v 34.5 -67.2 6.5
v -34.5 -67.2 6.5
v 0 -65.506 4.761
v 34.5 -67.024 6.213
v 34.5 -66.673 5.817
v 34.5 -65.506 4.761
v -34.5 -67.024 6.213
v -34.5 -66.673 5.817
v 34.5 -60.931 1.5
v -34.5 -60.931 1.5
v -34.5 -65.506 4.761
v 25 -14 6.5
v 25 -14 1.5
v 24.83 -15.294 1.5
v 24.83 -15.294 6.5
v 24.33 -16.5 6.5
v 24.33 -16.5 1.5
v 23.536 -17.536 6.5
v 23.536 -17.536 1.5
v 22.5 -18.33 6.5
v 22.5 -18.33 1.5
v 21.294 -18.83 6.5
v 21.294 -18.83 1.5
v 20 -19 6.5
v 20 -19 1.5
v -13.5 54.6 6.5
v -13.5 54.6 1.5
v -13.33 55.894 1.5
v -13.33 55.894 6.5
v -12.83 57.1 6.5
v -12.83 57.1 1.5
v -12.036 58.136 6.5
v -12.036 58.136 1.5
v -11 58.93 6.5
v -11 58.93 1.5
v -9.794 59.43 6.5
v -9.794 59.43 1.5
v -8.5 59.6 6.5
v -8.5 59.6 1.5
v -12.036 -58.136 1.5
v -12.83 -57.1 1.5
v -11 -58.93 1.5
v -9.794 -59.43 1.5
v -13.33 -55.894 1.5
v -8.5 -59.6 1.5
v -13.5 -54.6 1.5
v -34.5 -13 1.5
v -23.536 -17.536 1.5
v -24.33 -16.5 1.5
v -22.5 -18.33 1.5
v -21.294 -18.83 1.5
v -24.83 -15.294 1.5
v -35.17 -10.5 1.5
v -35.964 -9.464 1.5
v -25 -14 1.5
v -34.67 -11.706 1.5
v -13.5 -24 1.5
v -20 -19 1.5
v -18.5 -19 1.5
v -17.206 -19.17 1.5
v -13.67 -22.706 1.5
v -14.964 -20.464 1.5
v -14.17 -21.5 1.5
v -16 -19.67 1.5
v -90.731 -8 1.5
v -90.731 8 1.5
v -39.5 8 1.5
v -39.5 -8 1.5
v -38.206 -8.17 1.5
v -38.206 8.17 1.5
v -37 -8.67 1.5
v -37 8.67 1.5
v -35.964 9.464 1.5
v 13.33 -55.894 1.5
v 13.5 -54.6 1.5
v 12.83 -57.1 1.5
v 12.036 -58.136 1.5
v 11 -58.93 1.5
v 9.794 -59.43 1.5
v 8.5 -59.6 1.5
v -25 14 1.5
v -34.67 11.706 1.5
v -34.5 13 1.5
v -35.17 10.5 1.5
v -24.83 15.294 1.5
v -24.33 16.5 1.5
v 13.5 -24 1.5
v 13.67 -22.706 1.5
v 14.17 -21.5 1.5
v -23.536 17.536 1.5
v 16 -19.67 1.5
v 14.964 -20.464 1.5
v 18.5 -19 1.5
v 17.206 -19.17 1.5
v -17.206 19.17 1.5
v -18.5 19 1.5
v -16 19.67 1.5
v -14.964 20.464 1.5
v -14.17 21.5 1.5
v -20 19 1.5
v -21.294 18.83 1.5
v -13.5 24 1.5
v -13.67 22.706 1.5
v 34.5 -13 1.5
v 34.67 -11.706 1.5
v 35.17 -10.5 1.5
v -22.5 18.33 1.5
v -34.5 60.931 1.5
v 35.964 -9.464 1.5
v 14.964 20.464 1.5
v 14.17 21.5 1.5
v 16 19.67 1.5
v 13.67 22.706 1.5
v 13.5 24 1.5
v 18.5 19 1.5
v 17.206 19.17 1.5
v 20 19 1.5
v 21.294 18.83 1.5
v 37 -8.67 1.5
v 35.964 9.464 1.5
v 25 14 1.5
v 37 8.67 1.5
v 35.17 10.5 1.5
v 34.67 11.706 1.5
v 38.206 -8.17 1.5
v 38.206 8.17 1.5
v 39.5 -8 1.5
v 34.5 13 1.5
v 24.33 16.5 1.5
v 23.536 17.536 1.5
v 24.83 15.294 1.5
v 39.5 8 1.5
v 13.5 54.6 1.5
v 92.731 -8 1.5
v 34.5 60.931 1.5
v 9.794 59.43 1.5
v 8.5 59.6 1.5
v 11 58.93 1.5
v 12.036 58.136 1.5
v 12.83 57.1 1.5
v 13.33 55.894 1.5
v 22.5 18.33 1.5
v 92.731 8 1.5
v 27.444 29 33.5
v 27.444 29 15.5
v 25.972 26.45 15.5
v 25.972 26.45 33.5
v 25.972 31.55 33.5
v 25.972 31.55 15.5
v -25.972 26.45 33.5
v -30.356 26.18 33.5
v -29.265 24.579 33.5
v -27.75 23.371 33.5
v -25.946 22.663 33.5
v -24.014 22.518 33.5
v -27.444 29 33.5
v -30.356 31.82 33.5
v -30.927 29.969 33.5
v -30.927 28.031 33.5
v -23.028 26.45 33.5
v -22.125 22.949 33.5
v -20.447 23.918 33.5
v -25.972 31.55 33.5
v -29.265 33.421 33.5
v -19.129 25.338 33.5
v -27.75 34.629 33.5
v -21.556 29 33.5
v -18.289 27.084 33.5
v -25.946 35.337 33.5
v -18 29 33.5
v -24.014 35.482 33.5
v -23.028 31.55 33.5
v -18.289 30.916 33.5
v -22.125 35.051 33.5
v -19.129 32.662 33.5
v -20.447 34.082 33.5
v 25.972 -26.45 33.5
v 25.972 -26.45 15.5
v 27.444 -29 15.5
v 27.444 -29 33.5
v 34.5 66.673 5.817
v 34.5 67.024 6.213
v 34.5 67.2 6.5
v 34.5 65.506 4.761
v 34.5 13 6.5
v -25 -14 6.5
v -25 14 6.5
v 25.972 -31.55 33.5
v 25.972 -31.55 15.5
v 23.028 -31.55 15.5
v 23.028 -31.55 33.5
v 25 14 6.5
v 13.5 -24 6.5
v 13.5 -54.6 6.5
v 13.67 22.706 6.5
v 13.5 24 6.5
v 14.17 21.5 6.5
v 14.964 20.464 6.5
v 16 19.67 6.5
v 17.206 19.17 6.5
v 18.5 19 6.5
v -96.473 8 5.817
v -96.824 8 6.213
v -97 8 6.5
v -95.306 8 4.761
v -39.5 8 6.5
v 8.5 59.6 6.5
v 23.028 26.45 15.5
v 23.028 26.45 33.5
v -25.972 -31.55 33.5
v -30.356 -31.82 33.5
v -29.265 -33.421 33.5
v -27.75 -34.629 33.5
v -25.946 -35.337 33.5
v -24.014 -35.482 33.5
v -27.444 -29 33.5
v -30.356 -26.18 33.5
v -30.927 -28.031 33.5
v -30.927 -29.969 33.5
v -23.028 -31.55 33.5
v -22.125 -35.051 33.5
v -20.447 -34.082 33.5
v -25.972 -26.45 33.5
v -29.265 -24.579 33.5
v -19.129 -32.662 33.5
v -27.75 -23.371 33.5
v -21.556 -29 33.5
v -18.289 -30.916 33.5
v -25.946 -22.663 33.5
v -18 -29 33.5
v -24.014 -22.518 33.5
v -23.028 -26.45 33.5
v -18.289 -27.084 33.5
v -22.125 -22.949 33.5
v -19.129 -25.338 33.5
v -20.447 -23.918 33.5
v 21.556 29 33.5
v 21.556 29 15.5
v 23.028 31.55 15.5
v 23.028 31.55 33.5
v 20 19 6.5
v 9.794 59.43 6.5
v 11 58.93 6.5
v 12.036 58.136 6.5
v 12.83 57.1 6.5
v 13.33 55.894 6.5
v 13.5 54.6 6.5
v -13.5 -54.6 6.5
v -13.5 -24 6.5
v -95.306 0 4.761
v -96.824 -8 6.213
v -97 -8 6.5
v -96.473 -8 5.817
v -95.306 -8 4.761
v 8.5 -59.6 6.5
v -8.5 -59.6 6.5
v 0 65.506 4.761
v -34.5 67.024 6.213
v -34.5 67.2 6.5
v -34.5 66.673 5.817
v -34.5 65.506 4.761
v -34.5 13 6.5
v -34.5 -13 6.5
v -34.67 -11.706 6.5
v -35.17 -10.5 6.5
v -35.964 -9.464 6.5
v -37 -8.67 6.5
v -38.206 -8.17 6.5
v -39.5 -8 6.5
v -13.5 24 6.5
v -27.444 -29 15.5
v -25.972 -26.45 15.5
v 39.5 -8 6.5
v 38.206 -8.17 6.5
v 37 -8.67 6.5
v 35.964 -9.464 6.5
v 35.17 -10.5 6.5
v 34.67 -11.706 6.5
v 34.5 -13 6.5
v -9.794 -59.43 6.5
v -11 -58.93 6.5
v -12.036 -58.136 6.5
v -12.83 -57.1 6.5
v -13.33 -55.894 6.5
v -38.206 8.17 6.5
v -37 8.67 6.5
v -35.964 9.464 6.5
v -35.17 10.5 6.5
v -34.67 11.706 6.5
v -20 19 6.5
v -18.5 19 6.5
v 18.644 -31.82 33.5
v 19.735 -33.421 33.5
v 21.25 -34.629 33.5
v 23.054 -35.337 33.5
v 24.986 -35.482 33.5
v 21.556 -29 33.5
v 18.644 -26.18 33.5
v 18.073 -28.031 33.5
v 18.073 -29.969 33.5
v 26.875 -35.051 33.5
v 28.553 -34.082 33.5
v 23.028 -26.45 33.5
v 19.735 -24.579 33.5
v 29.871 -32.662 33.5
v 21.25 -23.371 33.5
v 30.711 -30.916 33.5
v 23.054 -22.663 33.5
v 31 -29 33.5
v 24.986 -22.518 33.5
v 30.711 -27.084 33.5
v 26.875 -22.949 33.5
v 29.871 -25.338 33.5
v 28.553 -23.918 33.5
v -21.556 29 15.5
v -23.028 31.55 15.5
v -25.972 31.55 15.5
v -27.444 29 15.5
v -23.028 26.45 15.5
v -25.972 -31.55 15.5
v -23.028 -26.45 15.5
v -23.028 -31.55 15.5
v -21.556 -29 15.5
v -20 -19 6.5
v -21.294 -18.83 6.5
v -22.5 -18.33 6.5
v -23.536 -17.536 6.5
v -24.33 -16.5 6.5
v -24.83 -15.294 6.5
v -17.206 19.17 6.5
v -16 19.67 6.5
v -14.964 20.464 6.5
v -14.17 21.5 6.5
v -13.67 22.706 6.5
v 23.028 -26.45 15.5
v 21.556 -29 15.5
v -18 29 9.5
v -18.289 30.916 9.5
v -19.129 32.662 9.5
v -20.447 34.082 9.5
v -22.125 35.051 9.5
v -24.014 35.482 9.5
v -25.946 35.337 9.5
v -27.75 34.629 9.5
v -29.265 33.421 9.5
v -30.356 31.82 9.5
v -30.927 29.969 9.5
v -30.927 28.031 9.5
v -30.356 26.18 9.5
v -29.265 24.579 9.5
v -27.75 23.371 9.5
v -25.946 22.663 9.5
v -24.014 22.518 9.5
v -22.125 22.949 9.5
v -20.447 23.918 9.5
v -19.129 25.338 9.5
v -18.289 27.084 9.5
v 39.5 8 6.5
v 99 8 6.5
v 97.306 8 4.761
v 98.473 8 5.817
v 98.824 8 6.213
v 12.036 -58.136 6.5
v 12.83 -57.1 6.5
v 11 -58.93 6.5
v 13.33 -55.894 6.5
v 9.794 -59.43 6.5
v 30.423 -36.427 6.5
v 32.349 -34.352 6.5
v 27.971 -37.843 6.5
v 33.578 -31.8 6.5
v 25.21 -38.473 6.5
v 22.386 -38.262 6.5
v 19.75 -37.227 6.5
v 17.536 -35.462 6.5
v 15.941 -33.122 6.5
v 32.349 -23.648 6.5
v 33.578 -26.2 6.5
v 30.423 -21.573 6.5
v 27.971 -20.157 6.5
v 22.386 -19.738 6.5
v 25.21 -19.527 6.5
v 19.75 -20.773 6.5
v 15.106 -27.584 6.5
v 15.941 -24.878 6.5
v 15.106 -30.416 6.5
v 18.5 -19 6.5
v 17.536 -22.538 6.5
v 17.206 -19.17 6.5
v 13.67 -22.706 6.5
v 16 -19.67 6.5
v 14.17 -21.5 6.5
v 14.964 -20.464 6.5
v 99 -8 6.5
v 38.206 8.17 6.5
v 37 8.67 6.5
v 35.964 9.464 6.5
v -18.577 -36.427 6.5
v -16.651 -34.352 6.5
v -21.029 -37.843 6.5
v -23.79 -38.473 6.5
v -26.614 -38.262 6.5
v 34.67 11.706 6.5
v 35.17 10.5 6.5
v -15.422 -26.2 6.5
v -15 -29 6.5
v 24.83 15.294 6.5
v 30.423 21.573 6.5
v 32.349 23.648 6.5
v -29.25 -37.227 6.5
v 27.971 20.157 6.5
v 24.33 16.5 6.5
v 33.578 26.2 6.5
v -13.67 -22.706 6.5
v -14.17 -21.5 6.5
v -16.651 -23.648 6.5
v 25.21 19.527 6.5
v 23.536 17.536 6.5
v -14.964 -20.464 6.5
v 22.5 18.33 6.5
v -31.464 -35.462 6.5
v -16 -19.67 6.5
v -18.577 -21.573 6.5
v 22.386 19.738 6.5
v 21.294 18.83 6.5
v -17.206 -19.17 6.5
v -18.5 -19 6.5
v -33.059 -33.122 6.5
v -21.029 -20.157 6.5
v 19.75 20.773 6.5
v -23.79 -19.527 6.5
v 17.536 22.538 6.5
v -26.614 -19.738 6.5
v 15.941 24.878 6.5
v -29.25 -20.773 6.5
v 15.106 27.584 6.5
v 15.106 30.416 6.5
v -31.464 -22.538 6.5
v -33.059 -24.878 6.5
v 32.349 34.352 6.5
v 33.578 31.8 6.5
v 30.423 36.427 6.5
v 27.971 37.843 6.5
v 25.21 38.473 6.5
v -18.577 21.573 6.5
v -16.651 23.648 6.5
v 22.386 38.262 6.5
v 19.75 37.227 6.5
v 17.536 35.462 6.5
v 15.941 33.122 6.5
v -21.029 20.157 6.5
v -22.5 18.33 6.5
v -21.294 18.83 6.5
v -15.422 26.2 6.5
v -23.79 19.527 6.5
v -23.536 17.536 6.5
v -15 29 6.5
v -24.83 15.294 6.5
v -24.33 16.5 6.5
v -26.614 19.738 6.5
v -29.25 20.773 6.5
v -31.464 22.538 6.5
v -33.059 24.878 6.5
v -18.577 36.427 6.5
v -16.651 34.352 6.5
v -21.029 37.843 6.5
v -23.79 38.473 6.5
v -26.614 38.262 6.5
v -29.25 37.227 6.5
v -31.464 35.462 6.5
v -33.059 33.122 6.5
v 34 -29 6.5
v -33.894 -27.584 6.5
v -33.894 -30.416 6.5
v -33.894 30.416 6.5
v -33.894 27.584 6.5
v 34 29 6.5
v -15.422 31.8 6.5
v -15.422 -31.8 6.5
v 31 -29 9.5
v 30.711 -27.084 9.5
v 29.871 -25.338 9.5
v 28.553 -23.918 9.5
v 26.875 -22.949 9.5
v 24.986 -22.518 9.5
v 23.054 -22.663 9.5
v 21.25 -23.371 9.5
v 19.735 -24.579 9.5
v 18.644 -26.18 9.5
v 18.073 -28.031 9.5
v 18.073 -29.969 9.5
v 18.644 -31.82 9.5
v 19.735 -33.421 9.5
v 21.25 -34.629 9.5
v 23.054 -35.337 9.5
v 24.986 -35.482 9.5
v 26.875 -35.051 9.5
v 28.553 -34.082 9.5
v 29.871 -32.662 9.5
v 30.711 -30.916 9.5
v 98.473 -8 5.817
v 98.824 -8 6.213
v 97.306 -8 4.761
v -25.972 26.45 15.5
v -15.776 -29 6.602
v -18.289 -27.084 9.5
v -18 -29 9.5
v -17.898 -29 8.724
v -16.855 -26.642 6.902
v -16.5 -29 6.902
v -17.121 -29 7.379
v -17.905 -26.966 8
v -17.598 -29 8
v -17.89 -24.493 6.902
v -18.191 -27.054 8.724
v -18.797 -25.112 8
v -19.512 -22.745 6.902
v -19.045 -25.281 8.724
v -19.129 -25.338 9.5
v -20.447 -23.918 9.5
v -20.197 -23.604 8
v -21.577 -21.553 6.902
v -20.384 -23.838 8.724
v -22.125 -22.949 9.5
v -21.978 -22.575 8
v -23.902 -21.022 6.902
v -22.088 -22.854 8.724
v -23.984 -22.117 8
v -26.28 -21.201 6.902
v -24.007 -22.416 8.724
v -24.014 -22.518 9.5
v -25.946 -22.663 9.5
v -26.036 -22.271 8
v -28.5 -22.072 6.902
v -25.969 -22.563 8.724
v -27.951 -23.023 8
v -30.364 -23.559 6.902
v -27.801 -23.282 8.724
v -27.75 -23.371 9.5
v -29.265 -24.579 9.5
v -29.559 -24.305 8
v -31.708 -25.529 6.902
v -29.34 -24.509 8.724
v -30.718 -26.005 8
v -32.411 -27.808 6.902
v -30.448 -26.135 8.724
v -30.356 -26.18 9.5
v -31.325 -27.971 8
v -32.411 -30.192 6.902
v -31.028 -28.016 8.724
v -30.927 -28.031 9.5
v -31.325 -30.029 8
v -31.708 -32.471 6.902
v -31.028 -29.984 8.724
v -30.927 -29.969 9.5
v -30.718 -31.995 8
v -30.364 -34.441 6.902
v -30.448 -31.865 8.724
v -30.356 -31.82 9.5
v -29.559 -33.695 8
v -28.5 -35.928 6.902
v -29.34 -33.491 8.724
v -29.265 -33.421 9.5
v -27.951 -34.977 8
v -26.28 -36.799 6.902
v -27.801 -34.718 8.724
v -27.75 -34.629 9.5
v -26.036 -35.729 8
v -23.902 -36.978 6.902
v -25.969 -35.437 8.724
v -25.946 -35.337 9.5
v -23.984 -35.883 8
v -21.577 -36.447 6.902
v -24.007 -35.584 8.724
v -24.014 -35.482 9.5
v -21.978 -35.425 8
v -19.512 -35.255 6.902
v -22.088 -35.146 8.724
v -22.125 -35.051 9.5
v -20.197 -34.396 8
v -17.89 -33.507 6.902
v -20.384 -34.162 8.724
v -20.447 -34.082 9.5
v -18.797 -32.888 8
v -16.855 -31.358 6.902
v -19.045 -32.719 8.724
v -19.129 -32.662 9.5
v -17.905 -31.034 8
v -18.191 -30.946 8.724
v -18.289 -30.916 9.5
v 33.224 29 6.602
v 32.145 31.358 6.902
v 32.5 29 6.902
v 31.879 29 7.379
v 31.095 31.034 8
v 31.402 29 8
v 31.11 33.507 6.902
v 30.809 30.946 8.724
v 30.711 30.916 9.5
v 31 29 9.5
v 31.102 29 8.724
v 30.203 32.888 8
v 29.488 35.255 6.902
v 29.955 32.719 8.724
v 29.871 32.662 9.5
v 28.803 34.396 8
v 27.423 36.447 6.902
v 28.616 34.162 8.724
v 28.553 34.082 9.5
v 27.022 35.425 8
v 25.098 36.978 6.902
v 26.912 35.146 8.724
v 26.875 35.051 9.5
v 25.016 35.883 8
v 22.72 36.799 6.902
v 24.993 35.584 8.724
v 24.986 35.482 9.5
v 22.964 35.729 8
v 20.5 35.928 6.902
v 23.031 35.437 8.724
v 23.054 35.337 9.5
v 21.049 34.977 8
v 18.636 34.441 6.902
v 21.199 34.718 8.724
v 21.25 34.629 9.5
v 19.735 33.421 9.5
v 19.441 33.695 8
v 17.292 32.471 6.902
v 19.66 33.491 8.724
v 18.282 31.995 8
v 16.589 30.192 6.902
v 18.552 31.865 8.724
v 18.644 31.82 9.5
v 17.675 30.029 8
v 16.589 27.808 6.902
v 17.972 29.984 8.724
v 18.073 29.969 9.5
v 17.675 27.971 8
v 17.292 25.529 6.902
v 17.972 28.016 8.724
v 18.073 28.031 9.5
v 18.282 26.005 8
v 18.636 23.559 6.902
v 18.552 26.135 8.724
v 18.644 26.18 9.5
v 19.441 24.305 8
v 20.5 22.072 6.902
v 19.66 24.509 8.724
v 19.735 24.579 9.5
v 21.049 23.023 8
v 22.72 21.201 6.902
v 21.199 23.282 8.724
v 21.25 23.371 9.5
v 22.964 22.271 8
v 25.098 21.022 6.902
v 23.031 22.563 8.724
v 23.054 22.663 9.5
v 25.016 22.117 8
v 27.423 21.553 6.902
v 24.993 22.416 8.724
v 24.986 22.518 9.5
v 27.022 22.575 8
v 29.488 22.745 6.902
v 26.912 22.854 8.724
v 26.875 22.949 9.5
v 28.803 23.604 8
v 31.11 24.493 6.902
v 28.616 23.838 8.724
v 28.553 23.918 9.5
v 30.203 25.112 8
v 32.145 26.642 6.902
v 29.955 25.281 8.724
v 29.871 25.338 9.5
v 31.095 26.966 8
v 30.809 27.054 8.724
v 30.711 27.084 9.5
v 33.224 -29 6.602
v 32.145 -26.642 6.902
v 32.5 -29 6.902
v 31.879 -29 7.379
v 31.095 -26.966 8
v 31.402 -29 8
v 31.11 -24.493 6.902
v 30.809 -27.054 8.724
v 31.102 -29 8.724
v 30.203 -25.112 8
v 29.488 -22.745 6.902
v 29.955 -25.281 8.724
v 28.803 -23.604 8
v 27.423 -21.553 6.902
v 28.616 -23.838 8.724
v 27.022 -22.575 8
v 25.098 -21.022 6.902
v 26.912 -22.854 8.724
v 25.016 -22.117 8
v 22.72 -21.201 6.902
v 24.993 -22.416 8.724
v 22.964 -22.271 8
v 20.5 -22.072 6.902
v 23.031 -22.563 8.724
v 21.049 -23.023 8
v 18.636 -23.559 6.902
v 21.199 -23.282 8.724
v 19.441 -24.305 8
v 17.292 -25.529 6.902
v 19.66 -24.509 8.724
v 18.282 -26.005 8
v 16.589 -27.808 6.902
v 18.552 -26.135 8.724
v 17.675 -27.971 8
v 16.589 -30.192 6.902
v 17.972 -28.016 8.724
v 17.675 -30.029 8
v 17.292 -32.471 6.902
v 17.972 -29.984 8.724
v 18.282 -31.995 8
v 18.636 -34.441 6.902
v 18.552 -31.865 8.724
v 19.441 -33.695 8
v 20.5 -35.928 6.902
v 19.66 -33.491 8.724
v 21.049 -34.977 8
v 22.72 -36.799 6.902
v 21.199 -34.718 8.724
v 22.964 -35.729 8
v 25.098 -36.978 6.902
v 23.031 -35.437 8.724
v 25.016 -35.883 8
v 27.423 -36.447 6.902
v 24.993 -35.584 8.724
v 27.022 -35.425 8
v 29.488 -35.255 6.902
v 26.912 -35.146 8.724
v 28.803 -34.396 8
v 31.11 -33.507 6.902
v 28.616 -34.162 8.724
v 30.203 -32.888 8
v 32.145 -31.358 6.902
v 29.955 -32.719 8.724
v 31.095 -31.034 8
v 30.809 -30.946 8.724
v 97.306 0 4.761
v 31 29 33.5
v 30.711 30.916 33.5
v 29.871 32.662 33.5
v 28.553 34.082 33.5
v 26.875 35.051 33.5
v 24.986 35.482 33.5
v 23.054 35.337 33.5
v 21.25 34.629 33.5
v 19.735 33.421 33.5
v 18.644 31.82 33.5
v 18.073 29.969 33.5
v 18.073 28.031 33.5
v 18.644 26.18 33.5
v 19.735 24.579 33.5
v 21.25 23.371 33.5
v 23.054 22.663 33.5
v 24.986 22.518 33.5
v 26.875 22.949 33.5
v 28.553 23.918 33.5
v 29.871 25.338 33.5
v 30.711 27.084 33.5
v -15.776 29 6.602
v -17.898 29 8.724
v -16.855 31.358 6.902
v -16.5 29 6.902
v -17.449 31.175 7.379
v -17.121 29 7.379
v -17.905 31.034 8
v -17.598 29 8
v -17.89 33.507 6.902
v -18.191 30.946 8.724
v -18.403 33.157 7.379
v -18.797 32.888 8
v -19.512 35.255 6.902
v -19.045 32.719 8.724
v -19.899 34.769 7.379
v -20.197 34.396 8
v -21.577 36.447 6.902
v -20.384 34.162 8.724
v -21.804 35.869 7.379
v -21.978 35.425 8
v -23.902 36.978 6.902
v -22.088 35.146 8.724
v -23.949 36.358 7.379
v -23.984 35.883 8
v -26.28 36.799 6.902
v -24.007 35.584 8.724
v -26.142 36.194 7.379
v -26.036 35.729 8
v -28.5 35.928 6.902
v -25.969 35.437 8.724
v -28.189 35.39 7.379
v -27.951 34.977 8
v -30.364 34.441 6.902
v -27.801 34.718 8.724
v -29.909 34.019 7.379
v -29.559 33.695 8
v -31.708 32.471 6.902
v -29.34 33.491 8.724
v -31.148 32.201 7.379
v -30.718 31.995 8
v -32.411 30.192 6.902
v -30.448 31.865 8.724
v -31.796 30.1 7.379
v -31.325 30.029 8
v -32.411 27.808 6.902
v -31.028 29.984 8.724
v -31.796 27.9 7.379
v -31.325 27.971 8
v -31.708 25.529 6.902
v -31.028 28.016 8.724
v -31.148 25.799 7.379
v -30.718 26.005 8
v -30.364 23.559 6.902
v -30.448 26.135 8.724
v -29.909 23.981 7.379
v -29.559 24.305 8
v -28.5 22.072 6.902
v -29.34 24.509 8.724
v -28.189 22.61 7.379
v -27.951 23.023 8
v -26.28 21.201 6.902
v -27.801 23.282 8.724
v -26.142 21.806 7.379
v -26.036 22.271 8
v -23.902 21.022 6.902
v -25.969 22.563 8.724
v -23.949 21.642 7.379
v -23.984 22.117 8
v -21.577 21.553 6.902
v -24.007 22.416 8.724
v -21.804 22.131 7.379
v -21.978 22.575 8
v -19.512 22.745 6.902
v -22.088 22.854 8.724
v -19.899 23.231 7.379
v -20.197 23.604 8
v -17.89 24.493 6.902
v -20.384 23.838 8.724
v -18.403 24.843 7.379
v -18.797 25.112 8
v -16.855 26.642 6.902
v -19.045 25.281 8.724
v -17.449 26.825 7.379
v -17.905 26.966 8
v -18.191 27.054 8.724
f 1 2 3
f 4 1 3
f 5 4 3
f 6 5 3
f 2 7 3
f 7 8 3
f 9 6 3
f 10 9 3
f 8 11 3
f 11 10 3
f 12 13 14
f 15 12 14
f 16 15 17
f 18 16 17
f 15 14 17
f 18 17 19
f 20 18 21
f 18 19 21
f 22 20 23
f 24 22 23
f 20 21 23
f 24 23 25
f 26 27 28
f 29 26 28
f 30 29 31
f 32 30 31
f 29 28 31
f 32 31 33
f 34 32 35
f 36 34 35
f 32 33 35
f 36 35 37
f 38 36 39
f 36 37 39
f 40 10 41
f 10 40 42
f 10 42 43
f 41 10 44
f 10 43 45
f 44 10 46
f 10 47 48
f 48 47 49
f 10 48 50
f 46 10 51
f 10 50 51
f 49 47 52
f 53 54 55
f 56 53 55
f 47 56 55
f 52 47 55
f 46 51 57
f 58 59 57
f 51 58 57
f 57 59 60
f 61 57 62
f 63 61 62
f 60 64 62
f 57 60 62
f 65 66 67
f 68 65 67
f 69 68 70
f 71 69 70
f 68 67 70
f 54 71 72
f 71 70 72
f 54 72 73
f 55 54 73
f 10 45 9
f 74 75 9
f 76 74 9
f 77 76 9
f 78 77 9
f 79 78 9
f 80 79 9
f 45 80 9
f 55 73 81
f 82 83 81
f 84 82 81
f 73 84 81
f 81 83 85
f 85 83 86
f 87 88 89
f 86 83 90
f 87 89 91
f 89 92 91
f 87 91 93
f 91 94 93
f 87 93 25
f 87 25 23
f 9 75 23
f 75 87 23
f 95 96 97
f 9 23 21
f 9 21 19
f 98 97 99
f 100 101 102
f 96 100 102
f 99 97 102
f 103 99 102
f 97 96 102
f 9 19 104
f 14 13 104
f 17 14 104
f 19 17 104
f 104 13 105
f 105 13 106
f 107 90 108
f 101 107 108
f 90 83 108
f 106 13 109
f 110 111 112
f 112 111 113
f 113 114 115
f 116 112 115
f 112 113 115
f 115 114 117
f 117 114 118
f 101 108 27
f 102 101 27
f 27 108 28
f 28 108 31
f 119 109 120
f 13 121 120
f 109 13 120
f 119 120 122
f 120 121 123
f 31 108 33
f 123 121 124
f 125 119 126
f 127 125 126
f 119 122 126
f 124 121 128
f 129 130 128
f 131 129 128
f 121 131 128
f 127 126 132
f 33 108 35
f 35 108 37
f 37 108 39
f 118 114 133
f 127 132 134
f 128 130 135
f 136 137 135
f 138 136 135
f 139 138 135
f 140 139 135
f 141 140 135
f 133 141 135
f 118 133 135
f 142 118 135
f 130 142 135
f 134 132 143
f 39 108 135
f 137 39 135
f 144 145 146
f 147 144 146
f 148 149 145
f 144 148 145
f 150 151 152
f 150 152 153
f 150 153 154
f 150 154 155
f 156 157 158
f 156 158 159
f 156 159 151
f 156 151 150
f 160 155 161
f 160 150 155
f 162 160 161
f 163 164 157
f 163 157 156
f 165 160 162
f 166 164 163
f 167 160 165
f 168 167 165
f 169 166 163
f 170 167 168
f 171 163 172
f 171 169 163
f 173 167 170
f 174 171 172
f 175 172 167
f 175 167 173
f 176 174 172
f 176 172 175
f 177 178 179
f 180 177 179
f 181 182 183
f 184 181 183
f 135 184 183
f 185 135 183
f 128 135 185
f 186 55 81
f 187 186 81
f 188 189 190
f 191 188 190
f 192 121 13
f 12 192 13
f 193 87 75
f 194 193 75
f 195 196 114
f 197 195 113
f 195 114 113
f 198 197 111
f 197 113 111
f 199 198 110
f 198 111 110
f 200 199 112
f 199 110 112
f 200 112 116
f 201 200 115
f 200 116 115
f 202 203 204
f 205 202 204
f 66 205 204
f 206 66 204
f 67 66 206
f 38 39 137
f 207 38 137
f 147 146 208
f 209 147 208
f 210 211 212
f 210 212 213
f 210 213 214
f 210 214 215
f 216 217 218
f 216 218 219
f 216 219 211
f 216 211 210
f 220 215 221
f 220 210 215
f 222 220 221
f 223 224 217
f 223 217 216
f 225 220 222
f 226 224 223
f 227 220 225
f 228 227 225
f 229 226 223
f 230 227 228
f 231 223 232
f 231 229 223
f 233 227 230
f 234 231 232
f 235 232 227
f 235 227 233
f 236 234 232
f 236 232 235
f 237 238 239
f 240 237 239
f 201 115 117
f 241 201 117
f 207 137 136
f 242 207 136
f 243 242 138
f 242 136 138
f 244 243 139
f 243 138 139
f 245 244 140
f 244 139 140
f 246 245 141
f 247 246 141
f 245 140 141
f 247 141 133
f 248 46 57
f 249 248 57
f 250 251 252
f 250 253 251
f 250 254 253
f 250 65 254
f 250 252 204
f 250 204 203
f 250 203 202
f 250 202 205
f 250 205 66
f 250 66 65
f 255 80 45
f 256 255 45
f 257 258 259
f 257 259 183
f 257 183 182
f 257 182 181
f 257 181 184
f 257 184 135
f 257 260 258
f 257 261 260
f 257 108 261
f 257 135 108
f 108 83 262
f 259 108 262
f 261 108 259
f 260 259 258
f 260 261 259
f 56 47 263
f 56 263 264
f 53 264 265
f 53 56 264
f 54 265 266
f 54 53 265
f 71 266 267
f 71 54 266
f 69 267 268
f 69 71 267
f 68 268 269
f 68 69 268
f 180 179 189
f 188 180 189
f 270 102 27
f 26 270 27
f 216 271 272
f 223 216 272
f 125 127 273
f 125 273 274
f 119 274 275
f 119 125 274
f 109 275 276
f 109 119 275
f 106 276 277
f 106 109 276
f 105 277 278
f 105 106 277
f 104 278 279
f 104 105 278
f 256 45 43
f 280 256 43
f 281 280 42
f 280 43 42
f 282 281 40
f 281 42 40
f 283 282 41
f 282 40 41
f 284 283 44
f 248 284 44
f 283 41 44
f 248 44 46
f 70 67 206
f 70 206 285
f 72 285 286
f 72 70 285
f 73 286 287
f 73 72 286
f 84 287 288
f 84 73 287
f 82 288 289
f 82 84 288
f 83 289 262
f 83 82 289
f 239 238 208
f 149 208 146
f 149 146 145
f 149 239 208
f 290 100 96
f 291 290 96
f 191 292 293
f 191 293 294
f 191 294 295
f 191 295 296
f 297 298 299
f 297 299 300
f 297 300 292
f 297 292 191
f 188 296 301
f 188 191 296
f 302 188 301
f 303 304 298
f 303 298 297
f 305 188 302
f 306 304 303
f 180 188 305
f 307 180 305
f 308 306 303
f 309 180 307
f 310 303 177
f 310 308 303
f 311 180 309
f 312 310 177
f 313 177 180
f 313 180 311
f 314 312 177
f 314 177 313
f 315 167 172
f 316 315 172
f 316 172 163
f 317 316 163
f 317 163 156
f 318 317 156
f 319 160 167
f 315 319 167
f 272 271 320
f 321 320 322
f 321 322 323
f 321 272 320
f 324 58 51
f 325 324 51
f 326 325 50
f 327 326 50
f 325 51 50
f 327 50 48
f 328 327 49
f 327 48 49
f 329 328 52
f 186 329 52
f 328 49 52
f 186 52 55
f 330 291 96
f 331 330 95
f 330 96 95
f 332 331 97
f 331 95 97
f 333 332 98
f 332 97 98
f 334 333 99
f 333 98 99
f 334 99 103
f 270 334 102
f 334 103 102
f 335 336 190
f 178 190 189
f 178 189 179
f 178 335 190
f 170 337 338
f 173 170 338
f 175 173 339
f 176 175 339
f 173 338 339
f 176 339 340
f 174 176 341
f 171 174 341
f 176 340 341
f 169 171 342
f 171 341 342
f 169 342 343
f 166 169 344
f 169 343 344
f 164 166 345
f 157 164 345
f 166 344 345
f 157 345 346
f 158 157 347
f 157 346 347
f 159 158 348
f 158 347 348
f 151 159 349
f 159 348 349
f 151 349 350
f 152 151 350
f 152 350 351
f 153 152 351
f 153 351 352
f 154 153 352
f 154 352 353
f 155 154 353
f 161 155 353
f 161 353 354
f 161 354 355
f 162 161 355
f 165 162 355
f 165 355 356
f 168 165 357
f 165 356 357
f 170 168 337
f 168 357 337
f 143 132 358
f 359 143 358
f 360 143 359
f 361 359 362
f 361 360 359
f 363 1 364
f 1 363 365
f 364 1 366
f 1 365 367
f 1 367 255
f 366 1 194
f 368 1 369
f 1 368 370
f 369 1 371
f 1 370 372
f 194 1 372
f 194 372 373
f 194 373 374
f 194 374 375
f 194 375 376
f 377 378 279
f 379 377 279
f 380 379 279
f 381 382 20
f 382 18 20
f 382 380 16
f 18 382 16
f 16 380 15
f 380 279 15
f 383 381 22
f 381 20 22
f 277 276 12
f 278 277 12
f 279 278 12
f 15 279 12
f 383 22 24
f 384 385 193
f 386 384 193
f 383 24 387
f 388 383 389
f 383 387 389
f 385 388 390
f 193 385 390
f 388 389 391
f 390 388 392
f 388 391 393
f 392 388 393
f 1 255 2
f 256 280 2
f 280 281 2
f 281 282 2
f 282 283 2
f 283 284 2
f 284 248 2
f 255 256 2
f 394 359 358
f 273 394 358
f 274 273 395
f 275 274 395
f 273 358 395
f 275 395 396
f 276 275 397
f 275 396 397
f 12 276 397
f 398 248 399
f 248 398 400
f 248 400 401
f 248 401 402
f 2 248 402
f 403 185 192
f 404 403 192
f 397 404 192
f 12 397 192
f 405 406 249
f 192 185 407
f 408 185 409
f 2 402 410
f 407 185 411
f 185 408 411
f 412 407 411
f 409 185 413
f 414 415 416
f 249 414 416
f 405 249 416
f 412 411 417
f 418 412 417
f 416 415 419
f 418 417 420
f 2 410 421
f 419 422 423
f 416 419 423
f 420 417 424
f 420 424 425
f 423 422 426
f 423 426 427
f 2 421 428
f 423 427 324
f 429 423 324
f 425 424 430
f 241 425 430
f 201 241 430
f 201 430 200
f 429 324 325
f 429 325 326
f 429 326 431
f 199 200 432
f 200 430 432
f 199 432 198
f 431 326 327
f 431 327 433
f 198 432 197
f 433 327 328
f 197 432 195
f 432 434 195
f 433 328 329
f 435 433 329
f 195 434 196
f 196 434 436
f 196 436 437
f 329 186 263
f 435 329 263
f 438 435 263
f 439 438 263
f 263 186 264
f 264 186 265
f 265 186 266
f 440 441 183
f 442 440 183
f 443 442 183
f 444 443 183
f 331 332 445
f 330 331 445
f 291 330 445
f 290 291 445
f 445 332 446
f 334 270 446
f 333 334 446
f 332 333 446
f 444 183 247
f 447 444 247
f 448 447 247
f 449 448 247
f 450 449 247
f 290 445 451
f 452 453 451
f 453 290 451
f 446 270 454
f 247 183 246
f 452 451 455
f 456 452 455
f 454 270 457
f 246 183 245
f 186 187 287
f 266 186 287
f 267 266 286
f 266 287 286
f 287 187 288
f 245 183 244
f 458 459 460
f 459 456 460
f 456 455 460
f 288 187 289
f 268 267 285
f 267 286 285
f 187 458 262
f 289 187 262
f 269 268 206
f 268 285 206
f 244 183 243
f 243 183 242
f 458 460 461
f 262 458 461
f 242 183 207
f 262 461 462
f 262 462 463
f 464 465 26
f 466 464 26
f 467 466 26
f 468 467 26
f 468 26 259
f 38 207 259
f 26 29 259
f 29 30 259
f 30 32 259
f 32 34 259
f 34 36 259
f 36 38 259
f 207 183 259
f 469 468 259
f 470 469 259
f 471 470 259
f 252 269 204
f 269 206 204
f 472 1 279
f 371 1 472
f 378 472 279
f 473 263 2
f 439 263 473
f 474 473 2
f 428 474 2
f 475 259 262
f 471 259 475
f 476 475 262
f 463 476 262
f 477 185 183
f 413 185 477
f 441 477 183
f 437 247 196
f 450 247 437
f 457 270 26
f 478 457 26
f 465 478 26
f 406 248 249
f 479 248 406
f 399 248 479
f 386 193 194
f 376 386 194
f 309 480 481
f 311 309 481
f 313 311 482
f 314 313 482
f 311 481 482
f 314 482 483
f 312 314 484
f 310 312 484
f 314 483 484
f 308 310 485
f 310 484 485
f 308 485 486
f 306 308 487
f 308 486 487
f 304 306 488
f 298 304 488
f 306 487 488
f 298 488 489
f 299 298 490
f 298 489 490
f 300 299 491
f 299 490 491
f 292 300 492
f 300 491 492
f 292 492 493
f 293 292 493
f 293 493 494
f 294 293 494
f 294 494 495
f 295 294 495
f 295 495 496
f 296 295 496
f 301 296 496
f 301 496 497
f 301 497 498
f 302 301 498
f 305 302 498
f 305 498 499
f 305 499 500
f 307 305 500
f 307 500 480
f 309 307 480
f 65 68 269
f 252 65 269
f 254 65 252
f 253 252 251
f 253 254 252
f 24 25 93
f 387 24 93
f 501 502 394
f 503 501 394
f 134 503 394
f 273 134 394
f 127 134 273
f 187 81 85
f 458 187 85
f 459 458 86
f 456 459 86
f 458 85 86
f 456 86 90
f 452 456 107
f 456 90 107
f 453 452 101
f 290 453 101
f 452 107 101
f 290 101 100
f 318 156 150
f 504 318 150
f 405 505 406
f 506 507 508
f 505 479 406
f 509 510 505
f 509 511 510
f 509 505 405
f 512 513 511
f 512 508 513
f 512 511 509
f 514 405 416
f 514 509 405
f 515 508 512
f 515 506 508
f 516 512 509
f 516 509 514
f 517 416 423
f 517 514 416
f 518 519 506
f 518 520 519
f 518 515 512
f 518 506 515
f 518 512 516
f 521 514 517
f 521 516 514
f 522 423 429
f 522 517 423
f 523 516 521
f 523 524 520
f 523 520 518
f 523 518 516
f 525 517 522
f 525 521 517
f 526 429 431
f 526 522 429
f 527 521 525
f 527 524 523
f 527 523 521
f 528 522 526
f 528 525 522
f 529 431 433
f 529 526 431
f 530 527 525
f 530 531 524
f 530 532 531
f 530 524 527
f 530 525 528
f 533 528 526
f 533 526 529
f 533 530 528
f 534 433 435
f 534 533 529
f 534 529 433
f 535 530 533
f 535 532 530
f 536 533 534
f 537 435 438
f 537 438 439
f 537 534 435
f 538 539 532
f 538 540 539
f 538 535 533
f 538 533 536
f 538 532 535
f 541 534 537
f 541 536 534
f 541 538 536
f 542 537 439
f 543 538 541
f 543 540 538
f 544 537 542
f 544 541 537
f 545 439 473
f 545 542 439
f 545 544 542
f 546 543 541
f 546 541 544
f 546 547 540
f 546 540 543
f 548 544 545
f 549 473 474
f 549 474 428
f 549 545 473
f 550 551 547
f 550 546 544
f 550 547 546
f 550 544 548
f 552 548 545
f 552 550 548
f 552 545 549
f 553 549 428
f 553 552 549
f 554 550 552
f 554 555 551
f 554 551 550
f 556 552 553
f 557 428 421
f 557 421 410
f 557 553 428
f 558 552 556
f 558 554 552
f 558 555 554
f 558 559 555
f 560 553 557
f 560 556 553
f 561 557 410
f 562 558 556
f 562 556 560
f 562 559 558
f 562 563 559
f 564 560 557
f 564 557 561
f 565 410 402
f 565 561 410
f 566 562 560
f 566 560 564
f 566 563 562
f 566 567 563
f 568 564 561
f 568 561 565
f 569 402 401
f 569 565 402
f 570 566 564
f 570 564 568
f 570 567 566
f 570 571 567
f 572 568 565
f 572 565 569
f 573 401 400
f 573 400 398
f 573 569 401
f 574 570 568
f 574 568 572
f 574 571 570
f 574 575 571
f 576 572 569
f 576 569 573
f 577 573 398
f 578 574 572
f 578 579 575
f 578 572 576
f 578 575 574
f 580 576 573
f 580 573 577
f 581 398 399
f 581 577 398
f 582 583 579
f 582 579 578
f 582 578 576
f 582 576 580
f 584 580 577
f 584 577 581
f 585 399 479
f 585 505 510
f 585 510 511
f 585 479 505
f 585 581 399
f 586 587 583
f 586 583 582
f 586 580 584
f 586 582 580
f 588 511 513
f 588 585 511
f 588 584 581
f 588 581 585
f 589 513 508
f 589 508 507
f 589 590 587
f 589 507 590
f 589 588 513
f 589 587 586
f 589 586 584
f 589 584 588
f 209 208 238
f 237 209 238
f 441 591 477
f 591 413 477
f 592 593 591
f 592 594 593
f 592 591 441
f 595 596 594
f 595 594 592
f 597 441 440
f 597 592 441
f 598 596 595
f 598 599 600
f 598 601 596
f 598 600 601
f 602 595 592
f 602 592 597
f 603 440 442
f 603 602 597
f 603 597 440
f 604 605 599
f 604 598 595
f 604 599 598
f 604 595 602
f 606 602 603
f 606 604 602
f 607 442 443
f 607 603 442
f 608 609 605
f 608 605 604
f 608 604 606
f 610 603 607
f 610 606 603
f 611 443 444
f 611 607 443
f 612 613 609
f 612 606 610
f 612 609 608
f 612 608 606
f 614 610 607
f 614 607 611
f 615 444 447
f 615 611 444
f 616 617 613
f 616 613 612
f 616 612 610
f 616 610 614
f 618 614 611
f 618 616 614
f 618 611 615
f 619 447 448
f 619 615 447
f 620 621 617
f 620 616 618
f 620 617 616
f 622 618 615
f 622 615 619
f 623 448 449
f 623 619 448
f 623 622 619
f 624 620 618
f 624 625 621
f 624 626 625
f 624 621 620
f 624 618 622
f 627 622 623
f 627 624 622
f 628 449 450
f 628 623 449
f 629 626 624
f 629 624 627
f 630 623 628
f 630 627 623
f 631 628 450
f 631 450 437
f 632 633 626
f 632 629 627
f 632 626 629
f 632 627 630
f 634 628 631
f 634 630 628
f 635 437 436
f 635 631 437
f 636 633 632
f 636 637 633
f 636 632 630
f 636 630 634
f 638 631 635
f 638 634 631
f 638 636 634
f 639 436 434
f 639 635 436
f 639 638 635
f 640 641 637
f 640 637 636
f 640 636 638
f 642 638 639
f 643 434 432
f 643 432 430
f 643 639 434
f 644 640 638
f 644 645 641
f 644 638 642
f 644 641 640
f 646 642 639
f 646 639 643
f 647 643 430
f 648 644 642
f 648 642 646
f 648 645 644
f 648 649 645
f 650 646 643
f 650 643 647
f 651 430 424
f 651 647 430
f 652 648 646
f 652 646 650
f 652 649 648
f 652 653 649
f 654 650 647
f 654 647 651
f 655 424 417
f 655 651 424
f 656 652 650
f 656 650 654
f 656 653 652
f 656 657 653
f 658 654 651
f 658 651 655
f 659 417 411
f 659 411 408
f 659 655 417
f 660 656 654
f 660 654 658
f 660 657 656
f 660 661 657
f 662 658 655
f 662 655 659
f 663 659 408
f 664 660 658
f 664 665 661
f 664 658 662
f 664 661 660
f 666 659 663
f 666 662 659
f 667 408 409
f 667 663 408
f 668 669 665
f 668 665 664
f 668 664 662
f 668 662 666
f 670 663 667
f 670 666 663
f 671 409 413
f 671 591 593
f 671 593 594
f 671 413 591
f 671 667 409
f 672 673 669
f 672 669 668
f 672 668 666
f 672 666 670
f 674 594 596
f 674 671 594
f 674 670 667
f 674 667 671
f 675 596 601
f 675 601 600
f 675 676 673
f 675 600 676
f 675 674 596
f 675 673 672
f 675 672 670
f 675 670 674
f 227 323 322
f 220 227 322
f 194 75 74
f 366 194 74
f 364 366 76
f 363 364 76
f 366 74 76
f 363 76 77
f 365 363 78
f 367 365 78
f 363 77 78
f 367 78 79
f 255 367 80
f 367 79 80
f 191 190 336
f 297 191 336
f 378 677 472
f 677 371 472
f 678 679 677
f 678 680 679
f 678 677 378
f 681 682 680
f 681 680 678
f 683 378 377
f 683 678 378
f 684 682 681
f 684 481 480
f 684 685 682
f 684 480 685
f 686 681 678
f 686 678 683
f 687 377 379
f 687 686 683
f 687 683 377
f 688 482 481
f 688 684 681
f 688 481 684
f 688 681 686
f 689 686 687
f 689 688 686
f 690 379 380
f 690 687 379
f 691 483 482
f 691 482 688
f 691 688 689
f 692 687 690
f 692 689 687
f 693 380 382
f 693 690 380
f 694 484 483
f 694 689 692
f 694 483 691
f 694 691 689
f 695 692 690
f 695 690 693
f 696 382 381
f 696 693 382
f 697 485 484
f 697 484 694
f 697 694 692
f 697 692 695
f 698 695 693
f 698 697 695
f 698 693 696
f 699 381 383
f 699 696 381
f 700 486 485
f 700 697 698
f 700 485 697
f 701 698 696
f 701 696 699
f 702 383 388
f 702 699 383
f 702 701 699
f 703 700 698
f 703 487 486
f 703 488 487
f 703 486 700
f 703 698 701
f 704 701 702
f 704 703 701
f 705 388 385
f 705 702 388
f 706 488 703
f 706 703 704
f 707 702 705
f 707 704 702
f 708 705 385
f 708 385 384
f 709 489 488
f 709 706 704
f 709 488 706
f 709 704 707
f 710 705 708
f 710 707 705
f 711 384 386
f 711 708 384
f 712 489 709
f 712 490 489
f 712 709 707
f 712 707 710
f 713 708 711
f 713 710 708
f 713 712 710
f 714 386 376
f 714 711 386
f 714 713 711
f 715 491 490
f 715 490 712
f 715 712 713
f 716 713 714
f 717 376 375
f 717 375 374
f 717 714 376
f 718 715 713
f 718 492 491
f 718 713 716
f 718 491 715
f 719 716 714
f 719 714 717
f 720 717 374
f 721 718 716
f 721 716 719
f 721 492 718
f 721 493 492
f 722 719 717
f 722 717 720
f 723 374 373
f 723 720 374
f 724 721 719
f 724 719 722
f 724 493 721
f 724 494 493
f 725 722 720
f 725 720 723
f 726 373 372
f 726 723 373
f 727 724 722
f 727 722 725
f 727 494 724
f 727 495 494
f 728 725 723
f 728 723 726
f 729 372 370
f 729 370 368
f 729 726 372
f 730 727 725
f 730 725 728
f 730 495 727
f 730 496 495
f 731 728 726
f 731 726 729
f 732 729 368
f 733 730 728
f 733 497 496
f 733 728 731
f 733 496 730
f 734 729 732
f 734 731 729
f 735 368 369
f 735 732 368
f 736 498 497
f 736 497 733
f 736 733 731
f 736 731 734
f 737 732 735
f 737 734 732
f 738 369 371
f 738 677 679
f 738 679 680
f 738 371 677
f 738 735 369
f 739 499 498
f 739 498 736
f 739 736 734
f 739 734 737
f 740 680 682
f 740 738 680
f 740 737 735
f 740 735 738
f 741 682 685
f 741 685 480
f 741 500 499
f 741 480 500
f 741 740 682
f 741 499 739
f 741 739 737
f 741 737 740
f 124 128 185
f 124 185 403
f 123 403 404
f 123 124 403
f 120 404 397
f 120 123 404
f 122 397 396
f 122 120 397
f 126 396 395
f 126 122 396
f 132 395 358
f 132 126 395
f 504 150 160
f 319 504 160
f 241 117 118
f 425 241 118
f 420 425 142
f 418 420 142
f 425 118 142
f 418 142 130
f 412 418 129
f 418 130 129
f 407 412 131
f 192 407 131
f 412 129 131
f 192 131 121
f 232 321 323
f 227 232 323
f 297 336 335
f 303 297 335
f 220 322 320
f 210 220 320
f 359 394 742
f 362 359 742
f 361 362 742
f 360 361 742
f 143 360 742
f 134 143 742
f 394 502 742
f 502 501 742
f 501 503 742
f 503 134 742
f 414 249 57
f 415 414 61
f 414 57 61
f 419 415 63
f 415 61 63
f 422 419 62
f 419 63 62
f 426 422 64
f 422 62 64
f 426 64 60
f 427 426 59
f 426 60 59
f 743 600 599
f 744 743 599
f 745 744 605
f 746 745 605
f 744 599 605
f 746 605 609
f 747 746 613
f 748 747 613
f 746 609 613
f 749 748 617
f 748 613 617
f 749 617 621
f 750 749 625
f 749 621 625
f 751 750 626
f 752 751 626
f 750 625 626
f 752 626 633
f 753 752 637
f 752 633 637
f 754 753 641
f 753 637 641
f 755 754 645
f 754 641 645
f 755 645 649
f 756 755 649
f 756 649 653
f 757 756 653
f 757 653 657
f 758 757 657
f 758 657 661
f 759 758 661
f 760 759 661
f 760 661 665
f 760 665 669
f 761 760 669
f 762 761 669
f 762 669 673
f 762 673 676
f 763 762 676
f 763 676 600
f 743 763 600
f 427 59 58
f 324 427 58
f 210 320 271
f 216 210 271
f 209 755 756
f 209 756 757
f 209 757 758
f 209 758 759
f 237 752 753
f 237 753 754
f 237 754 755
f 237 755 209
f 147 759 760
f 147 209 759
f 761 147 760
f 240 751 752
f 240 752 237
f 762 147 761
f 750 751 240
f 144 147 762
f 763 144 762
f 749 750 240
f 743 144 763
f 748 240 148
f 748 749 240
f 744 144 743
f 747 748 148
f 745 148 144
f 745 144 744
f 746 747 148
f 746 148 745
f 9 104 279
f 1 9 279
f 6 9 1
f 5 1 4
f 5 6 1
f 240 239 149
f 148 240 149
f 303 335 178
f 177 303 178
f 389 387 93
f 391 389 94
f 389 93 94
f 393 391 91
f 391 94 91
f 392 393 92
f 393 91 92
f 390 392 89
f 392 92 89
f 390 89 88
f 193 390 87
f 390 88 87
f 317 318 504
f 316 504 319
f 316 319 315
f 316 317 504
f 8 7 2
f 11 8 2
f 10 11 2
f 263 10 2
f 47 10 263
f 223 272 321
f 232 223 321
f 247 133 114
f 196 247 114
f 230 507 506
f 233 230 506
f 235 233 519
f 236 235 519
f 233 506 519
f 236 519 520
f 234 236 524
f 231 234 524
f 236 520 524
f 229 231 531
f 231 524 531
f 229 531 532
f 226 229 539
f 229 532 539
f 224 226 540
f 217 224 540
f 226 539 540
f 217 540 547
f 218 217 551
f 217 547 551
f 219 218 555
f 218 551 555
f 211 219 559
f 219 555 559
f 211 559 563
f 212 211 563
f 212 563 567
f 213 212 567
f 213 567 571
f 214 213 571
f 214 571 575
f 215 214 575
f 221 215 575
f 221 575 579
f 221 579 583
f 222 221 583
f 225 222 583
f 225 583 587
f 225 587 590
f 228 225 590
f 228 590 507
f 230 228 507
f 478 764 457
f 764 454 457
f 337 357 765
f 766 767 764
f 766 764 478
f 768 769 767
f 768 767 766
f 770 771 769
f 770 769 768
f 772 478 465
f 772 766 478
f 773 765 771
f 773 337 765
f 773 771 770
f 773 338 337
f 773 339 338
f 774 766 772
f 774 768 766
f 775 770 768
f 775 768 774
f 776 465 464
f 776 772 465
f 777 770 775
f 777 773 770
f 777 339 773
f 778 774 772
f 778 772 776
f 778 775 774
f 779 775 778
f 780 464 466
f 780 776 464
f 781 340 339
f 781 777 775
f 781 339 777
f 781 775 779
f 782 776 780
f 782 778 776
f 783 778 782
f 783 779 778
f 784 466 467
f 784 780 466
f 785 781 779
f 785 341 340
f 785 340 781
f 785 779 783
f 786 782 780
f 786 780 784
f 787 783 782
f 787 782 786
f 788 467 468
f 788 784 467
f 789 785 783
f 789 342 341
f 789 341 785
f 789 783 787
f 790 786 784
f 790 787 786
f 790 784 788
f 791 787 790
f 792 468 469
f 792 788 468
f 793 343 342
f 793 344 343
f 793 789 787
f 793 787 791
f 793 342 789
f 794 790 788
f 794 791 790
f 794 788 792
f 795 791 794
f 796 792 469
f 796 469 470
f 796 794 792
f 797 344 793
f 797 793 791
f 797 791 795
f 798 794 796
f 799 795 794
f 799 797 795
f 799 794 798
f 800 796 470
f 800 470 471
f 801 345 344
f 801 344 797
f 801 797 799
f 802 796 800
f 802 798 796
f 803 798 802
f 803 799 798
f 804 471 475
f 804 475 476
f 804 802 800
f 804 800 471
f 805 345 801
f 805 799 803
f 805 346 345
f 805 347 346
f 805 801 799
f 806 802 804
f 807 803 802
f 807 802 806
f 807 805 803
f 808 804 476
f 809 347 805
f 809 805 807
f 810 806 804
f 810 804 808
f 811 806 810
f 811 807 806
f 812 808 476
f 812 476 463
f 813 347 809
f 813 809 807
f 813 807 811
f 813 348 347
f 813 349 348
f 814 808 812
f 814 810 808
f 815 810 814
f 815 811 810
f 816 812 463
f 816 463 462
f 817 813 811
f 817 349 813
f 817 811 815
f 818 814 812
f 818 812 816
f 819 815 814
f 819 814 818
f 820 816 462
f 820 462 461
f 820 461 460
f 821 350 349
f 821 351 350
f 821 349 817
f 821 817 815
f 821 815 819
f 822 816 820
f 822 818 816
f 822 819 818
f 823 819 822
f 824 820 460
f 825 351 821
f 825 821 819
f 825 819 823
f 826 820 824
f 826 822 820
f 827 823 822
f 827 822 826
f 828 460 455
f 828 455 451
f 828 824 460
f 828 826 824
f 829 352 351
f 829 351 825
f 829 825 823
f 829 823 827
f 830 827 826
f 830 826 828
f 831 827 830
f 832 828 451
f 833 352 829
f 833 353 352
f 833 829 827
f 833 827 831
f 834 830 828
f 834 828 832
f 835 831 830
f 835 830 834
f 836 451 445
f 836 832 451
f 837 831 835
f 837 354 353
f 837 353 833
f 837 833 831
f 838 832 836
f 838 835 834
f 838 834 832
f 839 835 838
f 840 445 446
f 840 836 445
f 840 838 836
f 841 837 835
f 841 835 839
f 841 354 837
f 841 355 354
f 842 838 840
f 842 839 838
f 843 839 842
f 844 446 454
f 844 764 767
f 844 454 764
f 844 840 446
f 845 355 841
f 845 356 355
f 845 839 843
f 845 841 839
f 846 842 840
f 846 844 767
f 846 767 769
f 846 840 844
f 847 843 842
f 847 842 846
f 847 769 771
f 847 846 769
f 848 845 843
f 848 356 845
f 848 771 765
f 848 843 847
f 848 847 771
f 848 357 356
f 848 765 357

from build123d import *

# Parameters (mm, degrees)
BOSS_EXTRUDE1_DEPTH = 6.5
FILLET4_START       = -8
FILLET4_DEPTH       = 16
FILLET4_START_2     = -34.5
FILLET4_2_DEPTH     = 69
SKETCH4_W           = 251.095983112
SKETCH4_H           = 149.113377468
CUT_EXTRUDE2_DEPTH  = 1.5
SKETCH6_R           = 6.5
BOSS_EXTRUDE3_DEPTH = 27
FILLET3_R           = 3
CUT_EXTRUDE3_DEPTH  = 18
MIRROR1_START       = 6.5
MIRROR1_OUTLINE_R   = 6.5
MIRROR1_DEPTH       = 27
MIRROR1_2_DEPTH     = 9
CUT_EXTRUDE6_REACH  = 125.858


with BuildPart() as part:
    # Sketch1 → Boss-Extrude1 (new body)
    with BuildSketch(Plane.XY):
        with BuildLine():
            Line((34.5, -13), (34.5, -67.2))
            Line((34.5, -67.2), (-34.5, -67.2))
            Line((-34.5, -67.2), (-34.5, -13))
            ThreePointArc((-34.5, -13), (-35.964466094, -9.464466094), (-39.5, -8))
            Line((-39.5, -8), (-97, -8))
            Line((-97, -8), (-97, 8))
            Line((-97, 8), (-39.5, 8))
            ThreePointArc((-39.5, 8), (-35.964466094, 9.464466094), (-34.5, 13))
            Line((-34.5, 13), (-34.5, 67.2))
            Line((-34.5, 67.2), (34.5, 67.2))
            Line((34.5, 67.2), (34.5, 13))
            ThreePointArc((34.5, 13), (35.964466094, 9.464466094), (39.5, 8))
            Line((39.5, 8), (83.5, 8))
            Line((83.5, 8), (99, 8))
            Line((99, 8), (99, -8))
            Line((99, -8), (39.5, -8))
            ThreePointArc((39.5, -8), (35.964466094, -9.464466094), (34.5, -13))
        make_face()
    extrude(amount=BOSS_EXTRUDE1_DEPTH)

    # Fillet4: read off the stored shape, not the designer's step
    # Fillet4 outline → Fillet4 (cut)
    with BuildSketch(Plane(origin=(0, 0, 0), x_dir=(1, 0, 0), z_dir=(0, 1, 0)).offset(FILLET4_START)):
        with BuildLine():
            add(Edge.make_bspline(
                [(-97, -6.5), (-94.571389667, 0), (-87.632503002, 0)],
                knots=[0, 0, 0, 1, 1, 1], degree=2, weights=[1, 0.176470588, 1]))
            Line((-87.632503002, 0), (-97, 0))
            Line((-97, 0), (-97, -6.5))
        make_face()
        with BuildLine():
            add(Edge.make_bspline(
                [(99, -6.5), (96.571389667, 0), (89.632503002, 0)],
                knots=[0, 0, 0, 1, 1, 1], degree=2, weights=[1, 0.176470588, 1]))
            Line((99, -6.5), (99, 0))
            Line((99, 0), (89.632503002, 0))
        make_face()
    extrude(amount=FILLET4_DEPTH, mode=Mode.SUBTRACT)

    # Fillet4 2 outline → Fillet4 2 (cut)
    with BuildSketch(Plane.YZ.offset(FILLET4_START_2)):
        with BuildLine():
            Line((67.2, 0), (67.2, 6.5))
            add(Edge.make_bspline(
                [(67.2, 6.5), (64.771389667, 0), (57.832503002, 0)],
                knots=[0, 0, 0, 1, 1, 1], degree=2, weights=[1, 0.176470588, 1]))
            Line((57.832503002, 0), (67.2, 0))
        make_face()
        with BuildLine():
            Line((-67.2, 0), (-57.832503002, 0))
            add(Edge.make_bspline(
                [(-67.2, 6.5), (-64.771389667, 0), (-57.832503002, 0)],
                knots=[0, 0, 0, 1, 1, 1], degree=2, weights=[1, 0.176470588, 1]))
            Line((-67.2, 6.5), (-67.2, 0))
        make_face()
    extrude(amount=FILLET4_2_DEPTH, mode=Mode.SUBTRACT)

    # Sketch4 → Cut-Extrude2 (cut)
    with BuildSketch(Plane.XY):
        Rectangle(SKETCH4_W, SKETCH4_H)
    extrude(amount=CUT_EXTRUDE2_DEPTH, mode=Mode.SUBTRACT)

    # Sketch6 → Boss-Extrude3 (add)
    with BuildSketch(Plane.XY.offset(6.5)):
        with Locations((-24.5, 29)):
            Circle(SKETCH6_R)
    extrude(amount=BOSS_EXTRUDE3_DEPTH)

    # Fillet3
    fillet3_edges = [part.edges().sort_by_distance(p)[0] for p in [
        (-31, 29, 6.5),
    ]]
    fillet(fillet3_edges, radius=FILLET3_R)

    # Sketch7 → Cut-Extrude3 (cut)
    with BuildSketch(Plane.XY.offset(33.5)):
        Polygon((-27.444486373, 29), (-25.972243186, 26.45), (-23.027756814, 26.45), (-21.555513627, 29), (-23.027756814, 31.55), (-25.972243186, 31.55), align=None)
    extrude(amount=-CUT_EXTRUDE3_DEPTH, mode=Mode.SUBTRACT)

    # Mirror1: read off the stored shape, not the designer's step
    # Mirror1 outline → Mirror1 (add)
    # profile 1 of 3: a face of its own
    with BuildSketch(Plane.XY.offset(MIRROR1_START)):
        with Locations((24.5, 29)):
            Circle(MIRROR1_OUTLINE_R)
        Polygon((21.555513627, 29), (23.027756814, 31.55), (25.972243186, 31.55), (27.444486373, 29), (25.972243186, 26.45), (23.027756814, 26.45), align=None, mode=Mode.SUBTRACT)
    # profile 2 of 3: a face of its own
    with BuildSketch(Plane.XY.offset(MIRROR1_START)):
        with Locations((-24.5, -29)):
            Circle(MIRROR1_OUTLINE_R)
        Polygon((-23.027756814, -31.55), (-25.972243186, -31.55), (-27.444486373, -29), (-25.972243186, -26.45), (-23.027756814, -26.45), (-21.555513627, -29), align=None, mode=Mode.SUBTRACT)
    # profile 3 of 3: a face of its own
    with BuildSketch(Plane.XY.offset(MIRROR1_START)):
        with Locations((24.5, -29)):
            Circle(MIRROR1_OUTLINE_R)
        Polygon((23.027756814, -26.45), (25.972243186, -26.45), (27.444486373, -29), (25.972243186, -31.55), (23.027756814, -31.55), (21.555513627, -29), align=None, mode=Mode.SUBTRACT)
    extrude(amount=MIRROR1_DEPTH)

    # Mirror1 2 outline → Mirror1 2 (add)
    with BuildSketch(Plane.XY.offset(MIRROR1_START)):
        Polygon((25.972243186, 31.55), (23.027756814, 31.55), (21.555513627, 29), (23.027756814, 26.45), (25.972243186, 26.45), (27.444486373, 29), align=None)
        Polygon((-27.444486373, -29), (-25.972243186, -31.55), (-23.027756814, -31.55), (-21.555513627, -29), (-23.027756814, -26.45), (-25.972243186, -26.45), align=None)
        Polygon((27.444486373, -29), (25.972243186, -26.45), (23.027756814, -26.45), (21.555513627, -29), (23.027756814, -31.55), (25.972243186, -31.55), align=None)
    extrude(amount=MIRROR1_2_DEPTH)

    # Mirror1 3 outline → Mirror1 3 (revolve)
    with BuildSketch(Plane(origin=(24.5, 29, 0), x_dir=(1, 0, 0), z_dir=(0, -1, 0))):
        with BuildLine():
            ThreePointArc((9.5, 6.5), (7.378679656, 7.378679656), (6.5, 9.5))
            Line((6.5, 9.5), (6.5, 6.5))
            Line((6.5, 6.5), (9.5, 6.5))
        make_face()
    revolve(axis=Axis((24.5, 29, 0), (0, 0, 1)))

    # Mirror1 4 outline → Mirror1 4 (revolve)
    with BuildSketch(Plane(origin=(-24.5, -29, 0), x_dir=(1, 0, 0), z_dir=(0, -1, 0))):
        with BuildLine():
            ThreePointArc((9.5, 6.5), (7.378679656, 7.378679656), (6.5, 9.5))
            Line((6.5, 9.5), (6.5, 6.5))
            Line((6.5, 6.5), (9.5, 6.5))
        make_face()
    revolve(axis=Axis((-24.5, -29, 0), (0, 0, 1)))

    # Mirror1 5 outline → Mirror1 5 (revolve)
    with BuildSketch(Plane(origin=(24.5, -29, 0), x_dir=(1, 0, 0), z_dir=(0, -1, 0))):
        with BuildLine():
            ThreePointArc((9.5, 6.5), (7.378679656, 7.378679656), (6.5, 9.5))
            Line((6.5, 9.5), (6.5, 6.5))
            Line((6.5, 6.5), (9.5, 6.5))
        make_face()
    revolve(axis=Axis((24.5, -29, 0), (0, 0, 1)))

    # Sketch13 → Cut-Extrude6 (cut, up to next)
    with BuildSketch(Plane(origin=(0, 0, 1.5), x_dir=(-1, 0, 0), z_dir=(0, 0, -1)), mode=Mode.PRIVATE) as cut_extrude6_sk1:
        with BuildLine():
            Line((-13.5, 54.6), (-13.5, 24))
            ThreePointArc((-13.5, 24), (-14.964466094, 20.464466094), (-18.5, 19))
            Line((-18.5, 19), (-20, 19))
            ThreePointArc((-20, 19), (-23.535533906, 17.535533906), (-25, 14))
            Line((-25, 14), (-25, -14))
            ThreePointArc((-25, -14), (-23.535533906, -17.535533906), (-20, -19))
            Line((-20, -19), (-18.5, -19))
            ThreePointArc((-18.5, -19), (-14.964466094, -20.464466094), (-13.5, -24))
            Line((-13.5, -24), (-13.5, -54.6))
            ThreePointArc((-13.5, -54.6), (-12.035533906, -58.135533906), (-8.5, -59.6))
            Line((-8.5, -59.6), (8.5, -59.6))
            ThreePointArc((8.5, -59.6), (12.035533906, -58.135533906), (13.5, -54.6))
            Line((13.5, -54.6), (13.5, -24))
            ThreePointArc((13.5, -24), (14.964466094, -20.464466094), (18.5, -19))
            Line((18.5, -19), (20, -19))
            ThreePointArc((20, -19), (23.535533906, -17.535533906), (25, -14))
            Line((25, -14), (25, 14))
            ThreePointArc((25, 14), (23.535533906, 17.535533906), (20, 19))
            Line((20, 19), (18.5, 19))
            ThreePointArc((18.5, 19), (14.964466094, 20.464466094), (13.5, 24))
            Line((13.5, 24), (13.5, 54.6))
            ThreePointArc((13.5, 54.6), (12.035533906, 58.135533906), (8.5, 59.6))
            Line((8.5, 59.6), (-8.5, 59.6))
            ThreePointArc((-8.5, 59.6), (-12.035533906, 58.135533906), (-13.5, 54.6))
        make_face()
    cut_extrude6_tool1 = extrude(cut_extrude6_sk1.sketch, amount=-CUT_EXTRUDE6_REACH, mode=Mode.PRIVATE) & part.part
    add(cut_extrude6_tool1.solids().sort_by_distance((0, 0, 1.5))[0], mode=Mode.SUBTRACT)


solid = part.part
